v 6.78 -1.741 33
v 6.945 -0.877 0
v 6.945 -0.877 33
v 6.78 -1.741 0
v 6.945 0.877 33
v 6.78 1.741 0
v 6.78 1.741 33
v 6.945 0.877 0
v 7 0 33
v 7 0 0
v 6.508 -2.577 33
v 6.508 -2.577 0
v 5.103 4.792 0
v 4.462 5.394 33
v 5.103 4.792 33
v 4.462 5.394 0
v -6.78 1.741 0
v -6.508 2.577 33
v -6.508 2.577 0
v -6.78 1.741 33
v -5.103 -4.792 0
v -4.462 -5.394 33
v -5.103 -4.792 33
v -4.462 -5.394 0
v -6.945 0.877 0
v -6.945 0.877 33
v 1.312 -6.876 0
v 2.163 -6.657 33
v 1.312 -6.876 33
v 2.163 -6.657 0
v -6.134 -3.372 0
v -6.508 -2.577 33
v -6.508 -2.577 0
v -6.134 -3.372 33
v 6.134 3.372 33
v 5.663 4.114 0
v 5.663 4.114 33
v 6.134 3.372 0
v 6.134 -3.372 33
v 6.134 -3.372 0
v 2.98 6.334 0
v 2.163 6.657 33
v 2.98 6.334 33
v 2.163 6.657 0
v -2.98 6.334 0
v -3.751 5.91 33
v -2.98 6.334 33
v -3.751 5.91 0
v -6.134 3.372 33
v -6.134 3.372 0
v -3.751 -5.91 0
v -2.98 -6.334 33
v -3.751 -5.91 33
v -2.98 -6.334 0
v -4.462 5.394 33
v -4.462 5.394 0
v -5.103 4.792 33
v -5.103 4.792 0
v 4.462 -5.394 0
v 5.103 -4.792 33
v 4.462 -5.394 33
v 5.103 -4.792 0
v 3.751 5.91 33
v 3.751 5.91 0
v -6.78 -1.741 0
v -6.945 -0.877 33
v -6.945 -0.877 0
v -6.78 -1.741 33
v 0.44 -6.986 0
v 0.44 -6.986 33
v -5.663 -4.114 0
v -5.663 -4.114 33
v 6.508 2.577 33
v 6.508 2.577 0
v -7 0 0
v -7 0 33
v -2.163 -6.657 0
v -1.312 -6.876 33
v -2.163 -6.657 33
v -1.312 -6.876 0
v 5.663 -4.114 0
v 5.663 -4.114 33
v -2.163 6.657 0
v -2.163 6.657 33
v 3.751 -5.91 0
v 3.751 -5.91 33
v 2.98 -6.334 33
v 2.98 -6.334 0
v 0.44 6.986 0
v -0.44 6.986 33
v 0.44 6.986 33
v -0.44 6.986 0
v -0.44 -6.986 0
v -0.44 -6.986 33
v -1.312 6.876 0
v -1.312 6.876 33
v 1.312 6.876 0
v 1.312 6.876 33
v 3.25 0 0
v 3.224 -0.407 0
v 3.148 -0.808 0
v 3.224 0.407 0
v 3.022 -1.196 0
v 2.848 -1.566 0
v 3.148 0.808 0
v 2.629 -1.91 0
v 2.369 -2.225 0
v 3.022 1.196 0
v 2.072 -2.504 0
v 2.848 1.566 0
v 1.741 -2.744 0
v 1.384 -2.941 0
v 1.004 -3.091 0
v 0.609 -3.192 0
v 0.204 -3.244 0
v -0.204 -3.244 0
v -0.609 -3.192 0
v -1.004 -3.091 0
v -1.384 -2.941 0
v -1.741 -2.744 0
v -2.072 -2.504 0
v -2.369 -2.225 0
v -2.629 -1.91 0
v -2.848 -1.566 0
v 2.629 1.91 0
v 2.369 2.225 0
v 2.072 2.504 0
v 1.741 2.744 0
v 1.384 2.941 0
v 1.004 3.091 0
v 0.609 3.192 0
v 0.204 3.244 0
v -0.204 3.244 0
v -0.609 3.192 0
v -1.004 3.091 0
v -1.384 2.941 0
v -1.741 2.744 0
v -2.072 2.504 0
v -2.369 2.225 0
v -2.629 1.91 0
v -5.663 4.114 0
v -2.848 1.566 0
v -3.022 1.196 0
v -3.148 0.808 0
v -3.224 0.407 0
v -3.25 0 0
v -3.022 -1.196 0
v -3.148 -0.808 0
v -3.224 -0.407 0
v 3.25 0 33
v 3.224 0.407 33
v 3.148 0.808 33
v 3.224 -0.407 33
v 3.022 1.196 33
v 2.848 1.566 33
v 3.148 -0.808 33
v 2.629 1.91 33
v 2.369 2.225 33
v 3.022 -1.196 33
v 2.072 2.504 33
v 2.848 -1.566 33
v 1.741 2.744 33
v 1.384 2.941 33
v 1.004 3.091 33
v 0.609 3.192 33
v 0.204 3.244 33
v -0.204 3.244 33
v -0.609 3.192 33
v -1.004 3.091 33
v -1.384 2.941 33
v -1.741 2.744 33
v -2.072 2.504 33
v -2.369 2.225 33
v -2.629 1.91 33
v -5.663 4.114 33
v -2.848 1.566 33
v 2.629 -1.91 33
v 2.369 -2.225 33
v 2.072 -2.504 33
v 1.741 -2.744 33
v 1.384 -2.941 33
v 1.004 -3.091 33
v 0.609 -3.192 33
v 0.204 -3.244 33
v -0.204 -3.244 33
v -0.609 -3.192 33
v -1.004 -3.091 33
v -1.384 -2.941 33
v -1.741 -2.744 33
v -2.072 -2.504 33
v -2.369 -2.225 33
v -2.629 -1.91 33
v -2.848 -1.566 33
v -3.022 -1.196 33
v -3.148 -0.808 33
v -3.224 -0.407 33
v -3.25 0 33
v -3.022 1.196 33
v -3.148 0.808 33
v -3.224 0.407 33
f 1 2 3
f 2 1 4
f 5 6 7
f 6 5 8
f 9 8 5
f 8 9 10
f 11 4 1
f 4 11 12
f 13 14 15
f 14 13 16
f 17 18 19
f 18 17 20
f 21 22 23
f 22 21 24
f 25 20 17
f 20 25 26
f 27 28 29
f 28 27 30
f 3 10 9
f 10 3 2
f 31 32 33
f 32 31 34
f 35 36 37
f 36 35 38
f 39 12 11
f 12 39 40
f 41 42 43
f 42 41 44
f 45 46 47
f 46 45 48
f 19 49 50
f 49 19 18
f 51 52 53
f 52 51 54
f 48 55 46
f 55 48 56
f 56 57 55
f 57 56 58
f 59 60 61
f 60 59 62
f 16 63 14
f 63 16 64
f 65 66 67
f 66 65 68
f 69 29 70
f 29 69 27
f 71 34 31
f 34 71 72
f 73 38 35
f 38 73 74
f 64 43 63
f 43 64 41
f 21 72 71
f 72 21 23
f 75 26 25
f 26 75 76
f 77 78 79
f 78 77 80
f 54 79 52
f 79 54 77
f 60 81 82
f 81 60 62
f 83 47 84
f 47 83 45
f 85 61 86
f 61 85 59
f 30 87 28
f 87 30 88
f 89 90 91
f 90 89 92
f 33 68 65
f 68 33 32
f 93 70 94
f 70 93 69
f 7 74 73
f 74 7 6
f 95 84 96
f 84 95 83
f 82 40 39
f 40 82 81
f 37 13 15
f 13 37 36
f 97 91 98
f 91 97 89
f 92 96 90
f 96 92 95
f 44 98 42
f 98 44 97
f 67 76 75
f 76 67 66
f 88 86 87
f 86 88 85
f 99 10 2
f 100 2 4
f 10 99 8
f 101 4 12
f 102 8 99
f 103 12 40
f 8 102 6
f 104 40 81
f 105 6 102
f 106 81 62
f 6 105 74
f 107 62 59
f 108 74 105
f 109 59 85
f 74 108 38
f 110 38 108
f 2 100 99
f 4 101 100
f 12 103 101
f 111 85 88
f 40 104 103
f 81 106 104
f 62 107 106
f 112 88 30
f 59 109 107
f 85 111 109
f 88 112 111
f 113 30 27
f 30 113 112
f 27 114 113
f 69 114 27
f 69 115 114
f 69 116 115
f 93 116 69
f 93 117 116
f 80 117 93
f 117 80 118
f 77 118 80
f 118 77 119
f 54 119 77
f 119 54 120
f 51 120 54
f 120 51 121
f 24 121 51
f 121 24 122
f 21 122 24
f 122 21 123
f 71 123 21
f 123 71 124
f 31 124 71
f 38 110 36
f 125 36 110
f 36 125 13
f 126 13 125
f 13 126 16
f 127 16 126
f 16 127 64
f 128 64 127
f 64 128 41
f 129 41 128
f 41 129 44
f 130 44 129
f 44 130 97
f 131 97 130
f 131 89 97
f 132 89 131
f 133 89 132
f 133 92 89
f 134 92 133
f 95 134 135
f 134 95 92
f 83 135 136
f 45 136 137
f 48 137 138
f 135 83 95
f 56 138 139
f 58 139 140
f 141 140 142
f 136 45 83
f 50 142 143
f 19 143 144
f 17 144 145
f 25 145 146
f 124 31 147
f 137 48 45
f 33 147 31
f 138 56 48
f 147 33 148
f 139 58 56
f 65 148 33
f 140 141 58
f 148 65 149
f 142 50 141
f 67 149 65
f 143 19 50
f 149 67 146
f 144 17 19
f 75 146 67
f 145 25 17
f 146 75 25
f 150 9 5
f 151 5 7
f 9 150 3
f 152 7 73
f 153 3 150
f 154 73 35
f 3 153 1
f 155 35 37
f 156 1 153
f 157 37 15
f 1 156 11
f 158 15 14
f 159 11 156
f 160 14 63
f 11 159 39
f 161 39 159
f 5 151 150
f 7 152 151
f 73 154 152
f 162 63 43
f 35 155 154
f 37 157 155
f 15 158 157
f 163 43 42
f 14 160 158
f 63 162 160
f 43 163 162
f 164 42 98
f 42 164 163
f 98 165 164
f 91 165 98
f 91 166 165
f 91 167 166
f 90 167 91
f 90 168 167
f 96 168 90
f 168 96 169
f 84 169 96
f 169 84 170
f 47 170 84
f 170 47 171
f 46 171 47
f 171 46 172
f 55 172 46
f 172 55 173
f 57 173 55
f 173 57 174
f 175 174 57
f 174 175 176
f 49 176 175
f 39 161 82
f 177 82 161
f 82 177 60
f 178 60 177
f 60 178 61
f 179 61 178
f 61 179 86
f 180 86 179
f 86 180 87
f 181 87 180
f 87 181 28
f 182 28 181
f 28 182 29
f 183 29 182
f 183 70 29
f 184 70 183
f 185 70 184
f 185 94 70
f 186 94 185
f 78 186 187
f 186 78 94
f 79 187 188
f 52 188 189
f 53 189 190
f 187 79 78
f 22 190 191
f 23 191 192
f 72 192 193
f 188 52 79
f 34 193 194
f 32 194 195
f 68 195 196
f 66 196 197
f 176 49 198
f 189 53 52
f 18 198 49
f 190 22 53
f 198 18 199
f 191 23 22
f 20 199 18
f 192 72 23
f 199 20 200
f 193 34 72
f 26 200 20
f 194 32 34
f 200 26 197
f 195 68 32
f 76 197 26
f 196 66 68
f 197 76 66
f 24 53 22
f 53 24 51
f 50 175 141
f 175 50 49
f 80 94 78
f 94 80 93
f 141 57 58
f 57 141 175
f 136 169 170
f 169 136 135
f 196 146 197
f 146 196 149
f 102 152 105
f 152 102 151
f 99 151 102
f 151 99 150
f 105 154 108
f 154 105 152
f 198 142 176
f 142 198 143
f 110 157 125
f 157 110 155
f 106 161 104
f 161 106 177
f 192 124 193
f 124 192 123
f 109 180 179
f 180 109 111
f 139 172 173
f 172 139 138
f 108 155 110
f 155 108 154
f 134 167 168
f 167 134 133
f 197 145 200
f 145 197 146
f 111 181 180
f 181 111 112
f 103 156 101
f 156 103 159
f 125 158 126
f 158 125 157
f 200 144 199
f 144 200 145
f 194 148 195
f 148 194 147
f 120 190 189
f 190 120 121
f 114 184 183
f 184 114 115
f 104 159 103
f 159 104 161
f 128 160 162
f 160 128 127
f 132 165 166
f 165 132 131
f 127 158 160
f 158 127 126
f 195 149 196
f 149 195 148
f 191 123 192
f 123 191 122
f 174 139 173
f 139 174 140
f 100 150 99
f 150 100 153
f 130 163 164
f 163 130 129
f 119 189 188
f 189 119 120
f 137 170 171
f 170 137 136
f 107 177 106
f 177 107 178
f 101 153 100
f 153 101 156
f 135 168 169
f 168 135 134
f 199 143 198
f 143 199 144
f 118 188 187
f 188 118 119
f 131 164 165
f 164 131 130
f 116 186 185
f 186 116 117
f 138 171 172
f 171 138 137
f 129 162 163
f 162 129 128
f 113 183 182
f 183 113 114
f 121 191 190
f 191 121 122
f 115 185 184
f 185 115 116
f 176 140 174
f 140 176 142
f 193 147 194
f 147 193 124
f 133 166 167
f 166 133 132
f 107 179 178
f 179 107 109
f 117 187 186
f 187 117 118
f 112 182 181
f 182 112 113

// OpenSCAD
$fn = 50;


difference() {
	union() {
		cylinder(h = 33, r = 7.0000000000);
	}
	union() {
		translate(v = [0.0000000000, 0.0000000000, -100.0000000000]) {
			cylinder(h = 200, r = 3.2500000000);
		}
	}
}
